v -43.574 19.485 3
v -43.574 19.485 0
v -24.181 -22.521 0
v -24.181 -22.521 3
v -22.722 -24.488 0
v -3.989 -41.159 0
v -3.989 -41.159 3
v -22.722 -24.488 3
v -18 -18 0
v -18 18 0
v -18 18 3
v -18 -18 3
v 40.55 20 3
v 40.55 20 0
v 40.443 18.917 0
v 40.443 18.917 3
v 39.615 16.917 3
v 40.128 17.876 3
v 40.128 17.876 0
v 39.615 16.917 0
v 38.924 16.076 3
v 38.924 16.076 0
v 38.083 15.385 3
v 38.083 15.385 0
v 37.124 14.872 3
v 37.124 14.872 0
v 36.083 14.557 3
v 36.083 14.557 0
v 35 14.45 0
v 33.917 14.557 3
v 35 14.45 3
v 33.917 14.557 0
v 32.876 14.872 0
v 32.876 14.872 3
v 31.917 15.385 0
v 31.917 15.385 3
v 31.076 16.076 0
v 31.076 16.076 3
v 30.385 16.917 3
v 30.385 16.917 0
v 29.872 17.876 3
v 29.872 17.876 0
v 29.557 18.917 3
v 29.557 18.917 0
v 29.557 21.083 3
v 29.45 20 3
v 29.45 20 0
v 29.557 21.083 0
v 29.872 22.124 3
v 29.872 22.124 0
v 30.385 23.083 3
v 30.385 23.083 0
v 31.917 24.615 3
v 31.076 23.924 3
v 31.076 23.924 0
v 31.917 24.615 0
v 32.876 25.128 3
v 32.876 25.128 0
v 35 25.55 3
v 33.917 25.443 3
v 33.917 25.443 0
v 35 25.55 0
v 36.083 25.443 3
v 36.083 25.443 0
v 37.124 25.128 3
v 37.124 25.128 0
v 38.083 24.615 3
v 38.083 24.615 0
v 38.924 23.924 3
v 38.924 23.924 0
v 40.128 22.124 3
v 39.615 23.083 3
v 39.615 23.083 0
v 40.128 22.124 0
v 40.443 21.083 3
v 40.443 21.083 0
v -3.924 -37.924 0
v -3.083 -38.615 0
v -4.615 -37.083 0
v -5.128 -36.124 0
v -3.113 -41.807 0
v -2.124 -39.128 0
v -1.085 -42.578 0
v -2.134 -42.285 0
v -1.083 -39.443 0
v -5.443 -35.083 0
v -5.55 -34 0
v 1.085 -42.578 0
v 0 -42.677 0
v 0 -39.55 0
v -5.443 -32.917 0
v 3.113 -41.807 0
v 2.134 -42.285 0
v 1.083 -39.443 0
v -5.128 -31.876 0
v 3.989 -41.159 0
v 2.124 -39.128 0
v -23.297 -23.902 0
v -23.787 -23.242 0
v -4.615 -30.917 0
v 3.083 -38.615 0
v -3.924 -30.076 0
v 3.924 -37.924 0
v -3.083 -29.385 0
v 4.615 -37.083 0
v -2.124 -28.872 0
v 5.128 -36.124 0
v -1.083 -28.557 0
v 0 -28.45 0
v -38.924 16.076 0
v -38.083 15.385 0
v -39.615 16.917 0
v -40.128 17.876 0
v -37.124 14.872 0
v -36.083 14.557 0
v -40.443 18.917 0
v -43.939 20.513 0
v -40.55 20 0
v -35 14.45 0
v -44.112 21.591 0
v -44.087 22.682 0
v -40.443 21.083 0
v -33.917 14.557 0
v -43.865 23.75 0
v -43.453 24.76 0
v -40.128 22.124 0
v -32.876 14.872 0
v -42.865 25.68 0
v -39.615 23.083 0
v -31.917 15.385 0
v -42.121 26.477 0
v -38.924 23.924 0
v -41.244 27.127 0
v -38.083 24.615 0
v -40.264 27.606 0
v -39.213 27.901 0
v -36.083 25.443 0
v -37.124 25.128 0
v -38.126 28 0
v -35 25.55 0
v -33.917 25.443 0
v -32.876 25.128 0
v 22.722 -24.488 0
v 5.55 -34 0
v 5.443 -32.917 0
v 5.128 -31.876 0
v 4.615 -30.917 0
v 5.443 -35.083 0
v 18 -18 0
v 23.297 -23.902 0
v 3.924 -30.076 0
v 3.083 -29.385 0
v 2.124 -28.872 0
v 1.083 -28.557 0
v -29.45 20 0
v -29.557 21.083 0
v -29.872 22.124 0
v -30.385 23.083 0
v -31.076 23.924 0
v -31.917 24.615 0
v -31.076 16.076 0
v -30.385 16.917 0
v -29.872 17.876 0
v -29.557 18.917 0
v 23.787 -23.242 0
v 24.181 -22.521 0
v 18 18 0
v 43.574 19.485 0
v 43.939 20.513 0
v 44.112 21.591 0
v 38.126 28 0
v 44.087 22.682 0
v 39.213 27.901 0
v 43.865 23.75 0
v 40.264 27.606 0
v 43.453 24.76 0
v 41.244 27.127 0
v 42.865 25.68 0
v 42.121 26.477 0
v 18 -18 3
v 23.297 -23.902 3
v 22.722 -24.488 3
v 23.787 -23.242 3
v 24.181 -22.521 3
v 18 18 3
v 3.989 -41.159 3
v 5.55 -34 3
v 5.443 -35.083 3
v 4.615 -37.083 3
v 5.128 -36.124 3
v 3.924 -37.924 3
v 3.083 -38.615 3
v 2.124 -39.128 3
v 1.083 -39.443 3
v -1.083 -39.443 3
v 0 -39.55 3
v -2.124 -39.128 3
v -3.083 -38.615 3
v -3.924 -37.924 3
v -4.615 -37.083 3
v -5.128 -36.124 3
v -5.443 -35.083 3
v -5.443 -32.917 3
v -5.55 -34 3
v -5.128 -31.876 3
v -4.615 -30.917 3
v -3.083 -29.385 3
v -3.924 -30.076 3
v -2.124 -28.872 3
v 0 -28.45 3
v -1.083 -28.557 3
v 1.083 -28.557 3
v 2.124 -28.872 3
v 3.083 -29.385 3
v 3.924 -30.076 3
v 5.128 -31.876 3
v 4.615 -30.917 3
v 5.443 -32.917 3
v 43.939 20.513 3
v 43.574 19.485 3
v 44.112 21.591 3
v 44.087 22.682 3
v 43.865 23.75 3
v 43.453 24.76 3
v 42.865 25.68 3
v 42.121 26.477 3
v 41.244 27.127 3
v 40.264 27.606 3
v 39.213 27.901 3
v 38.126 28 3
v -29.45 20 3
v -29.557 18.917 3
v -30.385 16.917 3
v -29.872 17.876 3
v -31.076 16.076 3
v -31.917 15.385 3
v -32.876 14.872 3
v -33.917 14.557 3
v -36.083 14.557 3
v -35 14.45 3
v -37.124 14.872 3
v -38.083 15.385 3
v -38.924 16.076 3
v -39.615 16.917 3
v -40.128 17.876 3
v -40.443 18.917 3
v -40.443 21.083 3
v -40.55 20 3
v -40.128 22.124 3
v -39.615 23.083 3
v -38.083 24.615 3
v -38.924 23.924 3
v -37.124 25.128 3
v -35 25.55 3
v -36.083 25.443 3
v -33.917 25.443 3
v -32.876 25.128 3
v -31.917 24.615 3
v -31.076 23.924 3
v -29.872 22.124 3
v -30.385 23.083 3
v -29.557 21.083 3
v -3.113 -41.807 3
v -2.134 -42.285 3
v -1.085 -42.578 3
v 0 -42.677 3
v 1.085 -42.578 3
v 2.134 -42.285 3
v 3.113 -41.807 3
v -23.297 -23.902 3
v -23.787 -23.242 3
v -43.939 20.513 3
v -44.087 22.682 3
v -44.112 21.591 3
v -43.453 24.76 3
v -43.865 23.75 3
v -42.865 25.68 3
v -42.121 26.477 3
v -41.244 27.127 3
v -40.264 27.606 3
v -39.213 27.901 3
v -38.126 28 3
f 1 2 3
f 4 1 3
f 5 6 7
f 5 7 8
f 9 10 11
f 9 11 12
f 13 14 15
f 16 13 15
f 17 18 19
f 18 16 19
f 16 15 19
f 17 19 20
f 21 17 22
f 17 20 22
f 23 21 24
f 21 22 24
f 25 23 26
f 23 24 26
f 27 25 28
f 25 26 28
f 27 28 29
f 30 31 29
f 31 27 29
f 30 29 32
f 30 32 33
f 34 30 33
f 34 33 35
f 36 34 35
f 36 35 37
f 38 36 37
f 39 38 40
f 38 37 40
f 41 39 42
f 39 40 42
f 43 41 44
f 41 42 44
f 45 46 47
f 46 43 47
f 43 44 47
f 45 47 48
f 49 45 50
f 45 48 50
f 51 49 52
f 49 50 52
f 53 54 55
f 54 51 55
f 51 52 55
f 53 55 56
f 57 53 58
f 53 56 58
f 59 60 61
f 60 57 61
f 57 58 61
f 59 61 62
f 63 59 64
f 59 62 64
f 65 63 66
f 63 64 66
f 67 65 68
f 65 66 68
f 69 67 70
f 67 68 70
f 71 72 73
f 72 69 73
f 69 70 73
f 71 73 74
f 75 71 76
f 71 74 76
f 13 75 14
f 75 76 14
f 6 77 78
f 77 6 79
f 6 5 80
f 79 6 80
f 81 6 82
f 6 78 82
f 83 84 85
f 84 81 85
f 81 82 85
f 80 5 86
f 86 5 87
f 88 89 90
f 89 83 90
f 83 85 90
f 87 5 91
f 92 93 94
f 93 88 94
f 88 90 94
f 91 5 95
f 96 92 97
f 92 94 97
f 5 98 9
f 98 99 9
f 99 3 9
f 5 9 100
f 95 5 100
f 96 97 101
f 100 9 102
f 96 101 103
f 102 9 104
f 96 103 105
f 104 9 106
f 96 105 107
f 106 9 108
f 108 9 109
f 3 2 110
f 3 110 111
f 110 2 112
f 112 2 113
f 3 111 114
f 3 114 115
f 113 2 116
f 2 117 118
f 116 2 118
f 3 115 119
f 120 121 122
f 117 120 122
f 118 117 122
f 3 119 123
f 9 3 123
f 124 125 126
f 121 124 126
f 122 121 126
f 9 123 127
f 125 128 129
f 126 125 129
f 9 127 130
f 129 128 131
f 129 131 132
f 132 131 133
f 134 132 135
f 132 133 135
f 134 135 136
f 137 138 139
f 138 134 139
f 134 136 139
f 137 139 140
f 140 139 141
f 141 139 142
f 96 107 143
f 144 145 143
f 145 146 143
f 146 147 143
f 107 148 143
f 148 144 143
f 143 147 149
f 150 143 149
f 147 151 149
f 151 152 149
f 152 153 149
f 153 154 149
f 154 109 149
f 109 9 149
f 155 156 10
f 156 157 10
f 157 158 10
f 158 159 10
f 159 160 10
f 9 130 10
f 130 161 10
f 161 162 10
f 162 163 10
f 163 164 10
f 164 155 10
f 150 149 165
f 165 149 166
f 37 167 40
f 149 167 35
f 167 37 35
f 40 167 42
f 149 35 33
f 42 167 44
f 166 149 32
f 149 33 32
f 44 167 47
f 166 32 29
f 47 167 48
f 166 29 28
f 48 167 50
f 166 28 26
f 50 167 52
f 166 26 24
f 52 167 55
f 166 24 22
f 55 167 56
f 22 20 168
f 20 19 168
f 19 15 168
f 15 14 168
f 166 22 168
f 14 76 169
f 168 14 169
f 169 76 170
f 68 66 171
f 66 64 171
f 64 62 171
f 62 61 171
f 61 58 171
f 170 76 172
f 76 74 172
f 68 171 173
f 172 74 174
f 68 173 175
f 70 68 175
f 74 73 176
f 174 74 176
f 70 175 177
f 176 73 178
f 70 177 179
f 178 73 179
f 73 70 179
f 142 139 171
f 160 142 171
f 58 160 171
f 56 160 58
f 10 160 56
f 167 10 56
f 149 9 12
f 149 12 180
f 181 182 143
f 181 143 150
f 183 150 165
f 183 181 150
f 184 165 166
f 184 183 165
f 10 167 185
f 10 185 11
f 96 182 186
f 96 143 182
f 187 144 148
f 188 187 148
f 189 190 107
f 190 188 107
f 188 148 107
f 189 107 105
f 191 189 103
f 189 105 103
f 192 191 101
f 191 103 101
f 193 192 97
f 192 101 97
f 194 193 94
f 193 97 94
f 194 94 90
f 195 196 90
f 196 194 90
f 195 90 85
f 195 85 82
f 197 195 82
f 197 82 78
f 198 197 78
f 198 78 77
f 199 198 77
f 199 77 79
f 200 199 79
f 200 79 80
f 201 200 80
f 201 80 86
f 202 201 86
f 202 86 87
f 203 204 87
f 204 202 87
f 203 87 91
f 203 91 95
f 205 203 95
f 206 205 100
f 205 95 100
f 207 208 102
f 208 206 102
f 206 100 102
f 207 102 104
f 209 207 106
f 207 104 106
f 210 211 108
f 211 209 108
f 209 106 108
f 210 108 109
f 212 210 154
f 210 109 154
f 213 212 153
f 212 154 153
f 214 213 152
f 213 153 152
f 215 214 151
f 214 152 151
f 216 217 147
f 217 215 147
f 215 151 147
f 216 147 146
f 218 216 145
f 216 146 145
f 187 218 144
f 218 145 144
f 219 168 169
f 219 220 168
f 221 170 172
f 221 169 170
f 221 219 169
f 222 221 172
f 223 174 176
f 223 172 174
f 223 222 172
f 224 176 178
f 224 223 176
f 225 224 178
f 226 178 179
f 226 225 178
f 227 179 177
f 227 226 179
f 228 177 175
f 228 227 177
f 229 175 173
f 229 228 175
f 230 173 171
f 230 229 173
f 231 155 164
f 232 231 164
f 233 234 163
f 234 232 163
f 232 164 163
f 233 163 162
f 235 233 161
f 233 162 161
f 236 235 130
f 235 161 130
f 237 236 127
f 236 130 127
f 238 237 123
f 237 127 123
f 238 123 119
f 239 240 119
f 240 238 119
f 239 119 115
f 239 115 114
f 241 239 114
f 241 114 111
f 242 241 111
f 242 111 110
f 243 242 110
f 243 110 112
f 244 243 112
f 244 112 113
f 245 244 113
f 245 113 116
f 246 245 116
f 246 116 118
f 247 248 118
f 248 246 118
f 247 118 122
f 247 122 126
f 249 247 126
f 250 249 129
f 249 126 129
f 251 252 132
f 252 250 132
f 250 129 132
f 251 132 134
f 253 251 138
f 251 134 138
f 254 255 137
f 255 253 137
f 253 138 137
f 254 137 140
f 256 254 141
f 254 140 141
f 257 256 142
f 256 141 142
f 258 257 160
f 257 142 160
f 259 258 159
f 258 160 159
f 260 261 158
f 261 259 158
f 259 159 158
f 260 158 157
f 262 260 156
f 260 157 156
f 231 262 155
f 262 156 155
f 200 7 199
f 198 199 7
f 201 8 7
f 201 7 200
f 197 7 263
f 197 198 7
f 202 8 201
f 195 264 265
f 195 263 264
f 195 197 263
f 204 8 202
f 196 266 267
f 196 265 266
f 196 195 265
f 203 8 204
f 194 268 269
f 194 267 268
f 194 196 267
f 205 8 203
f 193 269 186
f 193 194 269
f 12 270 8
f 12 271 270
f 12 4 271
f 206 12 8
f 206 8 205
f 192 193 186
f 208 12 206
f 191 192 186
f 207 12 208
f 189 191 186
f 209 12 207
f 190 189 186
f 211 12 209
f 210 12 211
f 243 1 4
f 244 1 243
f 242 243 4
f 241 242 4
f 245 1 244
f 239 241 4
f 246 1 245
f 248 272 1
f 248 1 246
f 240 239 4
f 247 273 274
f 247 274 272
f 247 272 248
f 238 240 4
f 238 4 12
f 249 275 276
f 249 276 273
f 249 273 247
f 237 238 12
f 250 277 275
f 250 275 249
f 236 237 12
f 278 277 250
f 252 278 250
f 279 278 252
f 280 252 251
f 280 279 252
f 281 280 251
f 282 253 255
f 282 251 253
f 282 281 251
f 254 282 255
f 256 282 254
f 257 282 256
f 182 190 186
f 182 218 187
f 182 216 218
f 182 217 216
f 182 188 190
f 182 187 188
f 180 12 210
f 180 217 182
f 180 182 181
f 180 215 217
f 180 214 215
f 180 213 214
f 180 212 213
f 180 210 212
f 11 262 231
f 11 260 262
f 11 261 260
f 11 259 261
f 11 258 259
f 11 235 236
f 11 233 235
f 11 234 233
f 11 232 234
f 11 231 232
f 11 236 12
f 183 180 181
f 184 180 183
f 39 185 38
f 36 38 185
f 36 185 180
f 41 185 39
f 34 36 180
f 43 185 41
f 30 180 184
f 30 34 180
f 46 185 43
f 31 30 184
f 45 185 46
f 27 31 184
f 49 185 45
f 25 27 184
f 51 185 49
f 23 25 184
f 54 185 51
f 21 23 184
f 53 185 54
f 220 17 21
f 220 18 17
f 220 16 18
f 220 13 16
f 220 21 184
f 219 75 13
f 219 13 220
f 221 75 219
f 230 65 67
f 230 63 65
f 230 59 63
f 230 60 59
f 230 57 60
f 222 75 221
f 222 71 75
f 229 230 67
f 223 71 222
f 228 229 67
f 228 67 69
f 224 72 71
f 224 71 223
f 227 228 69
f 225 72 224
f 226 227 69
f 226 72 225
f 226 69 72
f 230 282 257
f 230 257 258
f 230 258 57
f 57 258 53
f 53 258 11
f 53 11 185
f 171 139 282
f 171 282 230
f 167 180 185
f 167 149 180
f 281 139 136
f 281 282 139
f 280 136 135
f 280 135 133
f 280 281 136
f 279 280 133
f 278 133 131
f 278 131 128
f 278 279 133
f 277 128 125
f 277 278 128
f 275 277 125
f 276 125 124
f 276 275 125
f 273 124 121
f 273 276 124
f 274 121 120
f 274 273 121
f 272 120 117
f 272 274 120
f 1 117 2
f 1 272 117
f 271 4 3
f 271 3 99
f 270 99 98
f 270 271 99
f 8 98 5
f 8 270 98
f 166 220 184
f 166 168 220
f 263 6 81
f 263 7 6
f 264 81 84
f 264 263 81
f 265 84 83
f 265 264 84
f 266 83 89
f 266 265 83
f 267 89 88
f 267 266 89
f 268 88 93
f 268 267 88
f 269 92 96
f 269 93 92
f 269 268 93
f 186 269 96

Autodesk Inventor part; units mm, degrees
ref_plane "YZ Plane" through (0, 0, 0) normal (1, 0, 0) x (0, 1, 0)
ref_plane "XZ Plane" through (0, 0, 0) normal (0, 1, 0) x (-1, 0, 0)
ref_plane "XY Plane" through (0, 0, 0) normal (0, 0, 1) x (1, 0, 0)
sketch "Sketch6" plane through (0, 0, 0) normal (0, 0, 1) x (1, 0, 0)
  line L0 (18, 18) -> (-18, 18)
  line L1 (-18, 18) -> (-18, -18)
  line L2 (-18, -18) -> (18, -18)
  line L3 (18, -18) -> (18, 18)
  line L4 (18, 18) -> (-18, -18) construction
  circle A0 centre (0, -34) radius 5.55
  circle A1 centre (35, 20) radius 5.55
  circle A2 centre (-35, 20) radius 5.55
  line L5 (35, 20) -> (-35, 20) construction
  line L6 (-35, 20) -> (0, -34) construction
  line L7 (0, -34) -> (35, 20) construction
  line L8 (0, 18) -> (0, -18) construction
  line L9 (-47.5046, 28) -> (47.5046, 28)
  line L10 (-18, 18) -> (23.6569, -23.6569) construction
  line L11 (18, 18) -> (-23.6569, -23.6569) construction
  line L12 (47.5046, 28) -> (23.6569, -23.6569)
  line L13 (23.6569, -23.6569) -> (0, -44.709)
  line L14 (0, -44.709) -> (-23.6569, -23.6569)
  line L15 (-47.5046, 28) -> (-23.6569, -23.6569)
  line L16 (-35, 20) -> (-42.2633, 16.6468) construction
  line L17 (0, -34) -> (-5.3183, -39.9763) construction
  point P0 (0, 0)
  point P1 (0, 0)
  point P2 (60, 0)
  point P3 (0, 28)
  point P4 (0, 0)
  dimension "d30" = 36
  dimension "d31" = 36
  dimension "d33" = 11.1
  dimension "d37" = 64.3506
  dimension "d52" = 70
  dimension "d53" = 8
  dimension "d54" = 20
  dimension "d57" = 8
  dimension "d59" = 8
  dimension "d60" = 95.0092
  dimension "d61" = 54
  dimension "d62" = 8
  dimension "d63" = 8
  dimension "d64" = 10
extrude "Plate3" add sketch "Sketch6" along normal blind 3
fillet "Corner Round2" radius 6 5 edges at (-47.5046, 28, 1.5) (47.5046, 28, 1.5) (0, -44.709, 1.5) (-23.6569, -23.6569, 1.5) (23.6569, -23.6569, 1.5)
equation "\"d41\" = Thickness"
equation "\"BendReliefWidth\" = Thickness"
equation "\"BendReliefDepth\" = 0.5 * Thickness"
equation "\"CornerReliefSize\" = 4 * Thickness"
equation "\"MinimumRemnant\" = 2 * Thickness"
equation "\"TransitionRadius\" = BendRadius"
equation "\"JacobiRadiusSize\" = BendRadius"
equation "\"GapSize\" = Thickness"
equation "\"Thickness\" = 3"
equation "\"BendRadius\" = 5"
properties part number "DSB-507 beam flange" material "Stainless Steel"
